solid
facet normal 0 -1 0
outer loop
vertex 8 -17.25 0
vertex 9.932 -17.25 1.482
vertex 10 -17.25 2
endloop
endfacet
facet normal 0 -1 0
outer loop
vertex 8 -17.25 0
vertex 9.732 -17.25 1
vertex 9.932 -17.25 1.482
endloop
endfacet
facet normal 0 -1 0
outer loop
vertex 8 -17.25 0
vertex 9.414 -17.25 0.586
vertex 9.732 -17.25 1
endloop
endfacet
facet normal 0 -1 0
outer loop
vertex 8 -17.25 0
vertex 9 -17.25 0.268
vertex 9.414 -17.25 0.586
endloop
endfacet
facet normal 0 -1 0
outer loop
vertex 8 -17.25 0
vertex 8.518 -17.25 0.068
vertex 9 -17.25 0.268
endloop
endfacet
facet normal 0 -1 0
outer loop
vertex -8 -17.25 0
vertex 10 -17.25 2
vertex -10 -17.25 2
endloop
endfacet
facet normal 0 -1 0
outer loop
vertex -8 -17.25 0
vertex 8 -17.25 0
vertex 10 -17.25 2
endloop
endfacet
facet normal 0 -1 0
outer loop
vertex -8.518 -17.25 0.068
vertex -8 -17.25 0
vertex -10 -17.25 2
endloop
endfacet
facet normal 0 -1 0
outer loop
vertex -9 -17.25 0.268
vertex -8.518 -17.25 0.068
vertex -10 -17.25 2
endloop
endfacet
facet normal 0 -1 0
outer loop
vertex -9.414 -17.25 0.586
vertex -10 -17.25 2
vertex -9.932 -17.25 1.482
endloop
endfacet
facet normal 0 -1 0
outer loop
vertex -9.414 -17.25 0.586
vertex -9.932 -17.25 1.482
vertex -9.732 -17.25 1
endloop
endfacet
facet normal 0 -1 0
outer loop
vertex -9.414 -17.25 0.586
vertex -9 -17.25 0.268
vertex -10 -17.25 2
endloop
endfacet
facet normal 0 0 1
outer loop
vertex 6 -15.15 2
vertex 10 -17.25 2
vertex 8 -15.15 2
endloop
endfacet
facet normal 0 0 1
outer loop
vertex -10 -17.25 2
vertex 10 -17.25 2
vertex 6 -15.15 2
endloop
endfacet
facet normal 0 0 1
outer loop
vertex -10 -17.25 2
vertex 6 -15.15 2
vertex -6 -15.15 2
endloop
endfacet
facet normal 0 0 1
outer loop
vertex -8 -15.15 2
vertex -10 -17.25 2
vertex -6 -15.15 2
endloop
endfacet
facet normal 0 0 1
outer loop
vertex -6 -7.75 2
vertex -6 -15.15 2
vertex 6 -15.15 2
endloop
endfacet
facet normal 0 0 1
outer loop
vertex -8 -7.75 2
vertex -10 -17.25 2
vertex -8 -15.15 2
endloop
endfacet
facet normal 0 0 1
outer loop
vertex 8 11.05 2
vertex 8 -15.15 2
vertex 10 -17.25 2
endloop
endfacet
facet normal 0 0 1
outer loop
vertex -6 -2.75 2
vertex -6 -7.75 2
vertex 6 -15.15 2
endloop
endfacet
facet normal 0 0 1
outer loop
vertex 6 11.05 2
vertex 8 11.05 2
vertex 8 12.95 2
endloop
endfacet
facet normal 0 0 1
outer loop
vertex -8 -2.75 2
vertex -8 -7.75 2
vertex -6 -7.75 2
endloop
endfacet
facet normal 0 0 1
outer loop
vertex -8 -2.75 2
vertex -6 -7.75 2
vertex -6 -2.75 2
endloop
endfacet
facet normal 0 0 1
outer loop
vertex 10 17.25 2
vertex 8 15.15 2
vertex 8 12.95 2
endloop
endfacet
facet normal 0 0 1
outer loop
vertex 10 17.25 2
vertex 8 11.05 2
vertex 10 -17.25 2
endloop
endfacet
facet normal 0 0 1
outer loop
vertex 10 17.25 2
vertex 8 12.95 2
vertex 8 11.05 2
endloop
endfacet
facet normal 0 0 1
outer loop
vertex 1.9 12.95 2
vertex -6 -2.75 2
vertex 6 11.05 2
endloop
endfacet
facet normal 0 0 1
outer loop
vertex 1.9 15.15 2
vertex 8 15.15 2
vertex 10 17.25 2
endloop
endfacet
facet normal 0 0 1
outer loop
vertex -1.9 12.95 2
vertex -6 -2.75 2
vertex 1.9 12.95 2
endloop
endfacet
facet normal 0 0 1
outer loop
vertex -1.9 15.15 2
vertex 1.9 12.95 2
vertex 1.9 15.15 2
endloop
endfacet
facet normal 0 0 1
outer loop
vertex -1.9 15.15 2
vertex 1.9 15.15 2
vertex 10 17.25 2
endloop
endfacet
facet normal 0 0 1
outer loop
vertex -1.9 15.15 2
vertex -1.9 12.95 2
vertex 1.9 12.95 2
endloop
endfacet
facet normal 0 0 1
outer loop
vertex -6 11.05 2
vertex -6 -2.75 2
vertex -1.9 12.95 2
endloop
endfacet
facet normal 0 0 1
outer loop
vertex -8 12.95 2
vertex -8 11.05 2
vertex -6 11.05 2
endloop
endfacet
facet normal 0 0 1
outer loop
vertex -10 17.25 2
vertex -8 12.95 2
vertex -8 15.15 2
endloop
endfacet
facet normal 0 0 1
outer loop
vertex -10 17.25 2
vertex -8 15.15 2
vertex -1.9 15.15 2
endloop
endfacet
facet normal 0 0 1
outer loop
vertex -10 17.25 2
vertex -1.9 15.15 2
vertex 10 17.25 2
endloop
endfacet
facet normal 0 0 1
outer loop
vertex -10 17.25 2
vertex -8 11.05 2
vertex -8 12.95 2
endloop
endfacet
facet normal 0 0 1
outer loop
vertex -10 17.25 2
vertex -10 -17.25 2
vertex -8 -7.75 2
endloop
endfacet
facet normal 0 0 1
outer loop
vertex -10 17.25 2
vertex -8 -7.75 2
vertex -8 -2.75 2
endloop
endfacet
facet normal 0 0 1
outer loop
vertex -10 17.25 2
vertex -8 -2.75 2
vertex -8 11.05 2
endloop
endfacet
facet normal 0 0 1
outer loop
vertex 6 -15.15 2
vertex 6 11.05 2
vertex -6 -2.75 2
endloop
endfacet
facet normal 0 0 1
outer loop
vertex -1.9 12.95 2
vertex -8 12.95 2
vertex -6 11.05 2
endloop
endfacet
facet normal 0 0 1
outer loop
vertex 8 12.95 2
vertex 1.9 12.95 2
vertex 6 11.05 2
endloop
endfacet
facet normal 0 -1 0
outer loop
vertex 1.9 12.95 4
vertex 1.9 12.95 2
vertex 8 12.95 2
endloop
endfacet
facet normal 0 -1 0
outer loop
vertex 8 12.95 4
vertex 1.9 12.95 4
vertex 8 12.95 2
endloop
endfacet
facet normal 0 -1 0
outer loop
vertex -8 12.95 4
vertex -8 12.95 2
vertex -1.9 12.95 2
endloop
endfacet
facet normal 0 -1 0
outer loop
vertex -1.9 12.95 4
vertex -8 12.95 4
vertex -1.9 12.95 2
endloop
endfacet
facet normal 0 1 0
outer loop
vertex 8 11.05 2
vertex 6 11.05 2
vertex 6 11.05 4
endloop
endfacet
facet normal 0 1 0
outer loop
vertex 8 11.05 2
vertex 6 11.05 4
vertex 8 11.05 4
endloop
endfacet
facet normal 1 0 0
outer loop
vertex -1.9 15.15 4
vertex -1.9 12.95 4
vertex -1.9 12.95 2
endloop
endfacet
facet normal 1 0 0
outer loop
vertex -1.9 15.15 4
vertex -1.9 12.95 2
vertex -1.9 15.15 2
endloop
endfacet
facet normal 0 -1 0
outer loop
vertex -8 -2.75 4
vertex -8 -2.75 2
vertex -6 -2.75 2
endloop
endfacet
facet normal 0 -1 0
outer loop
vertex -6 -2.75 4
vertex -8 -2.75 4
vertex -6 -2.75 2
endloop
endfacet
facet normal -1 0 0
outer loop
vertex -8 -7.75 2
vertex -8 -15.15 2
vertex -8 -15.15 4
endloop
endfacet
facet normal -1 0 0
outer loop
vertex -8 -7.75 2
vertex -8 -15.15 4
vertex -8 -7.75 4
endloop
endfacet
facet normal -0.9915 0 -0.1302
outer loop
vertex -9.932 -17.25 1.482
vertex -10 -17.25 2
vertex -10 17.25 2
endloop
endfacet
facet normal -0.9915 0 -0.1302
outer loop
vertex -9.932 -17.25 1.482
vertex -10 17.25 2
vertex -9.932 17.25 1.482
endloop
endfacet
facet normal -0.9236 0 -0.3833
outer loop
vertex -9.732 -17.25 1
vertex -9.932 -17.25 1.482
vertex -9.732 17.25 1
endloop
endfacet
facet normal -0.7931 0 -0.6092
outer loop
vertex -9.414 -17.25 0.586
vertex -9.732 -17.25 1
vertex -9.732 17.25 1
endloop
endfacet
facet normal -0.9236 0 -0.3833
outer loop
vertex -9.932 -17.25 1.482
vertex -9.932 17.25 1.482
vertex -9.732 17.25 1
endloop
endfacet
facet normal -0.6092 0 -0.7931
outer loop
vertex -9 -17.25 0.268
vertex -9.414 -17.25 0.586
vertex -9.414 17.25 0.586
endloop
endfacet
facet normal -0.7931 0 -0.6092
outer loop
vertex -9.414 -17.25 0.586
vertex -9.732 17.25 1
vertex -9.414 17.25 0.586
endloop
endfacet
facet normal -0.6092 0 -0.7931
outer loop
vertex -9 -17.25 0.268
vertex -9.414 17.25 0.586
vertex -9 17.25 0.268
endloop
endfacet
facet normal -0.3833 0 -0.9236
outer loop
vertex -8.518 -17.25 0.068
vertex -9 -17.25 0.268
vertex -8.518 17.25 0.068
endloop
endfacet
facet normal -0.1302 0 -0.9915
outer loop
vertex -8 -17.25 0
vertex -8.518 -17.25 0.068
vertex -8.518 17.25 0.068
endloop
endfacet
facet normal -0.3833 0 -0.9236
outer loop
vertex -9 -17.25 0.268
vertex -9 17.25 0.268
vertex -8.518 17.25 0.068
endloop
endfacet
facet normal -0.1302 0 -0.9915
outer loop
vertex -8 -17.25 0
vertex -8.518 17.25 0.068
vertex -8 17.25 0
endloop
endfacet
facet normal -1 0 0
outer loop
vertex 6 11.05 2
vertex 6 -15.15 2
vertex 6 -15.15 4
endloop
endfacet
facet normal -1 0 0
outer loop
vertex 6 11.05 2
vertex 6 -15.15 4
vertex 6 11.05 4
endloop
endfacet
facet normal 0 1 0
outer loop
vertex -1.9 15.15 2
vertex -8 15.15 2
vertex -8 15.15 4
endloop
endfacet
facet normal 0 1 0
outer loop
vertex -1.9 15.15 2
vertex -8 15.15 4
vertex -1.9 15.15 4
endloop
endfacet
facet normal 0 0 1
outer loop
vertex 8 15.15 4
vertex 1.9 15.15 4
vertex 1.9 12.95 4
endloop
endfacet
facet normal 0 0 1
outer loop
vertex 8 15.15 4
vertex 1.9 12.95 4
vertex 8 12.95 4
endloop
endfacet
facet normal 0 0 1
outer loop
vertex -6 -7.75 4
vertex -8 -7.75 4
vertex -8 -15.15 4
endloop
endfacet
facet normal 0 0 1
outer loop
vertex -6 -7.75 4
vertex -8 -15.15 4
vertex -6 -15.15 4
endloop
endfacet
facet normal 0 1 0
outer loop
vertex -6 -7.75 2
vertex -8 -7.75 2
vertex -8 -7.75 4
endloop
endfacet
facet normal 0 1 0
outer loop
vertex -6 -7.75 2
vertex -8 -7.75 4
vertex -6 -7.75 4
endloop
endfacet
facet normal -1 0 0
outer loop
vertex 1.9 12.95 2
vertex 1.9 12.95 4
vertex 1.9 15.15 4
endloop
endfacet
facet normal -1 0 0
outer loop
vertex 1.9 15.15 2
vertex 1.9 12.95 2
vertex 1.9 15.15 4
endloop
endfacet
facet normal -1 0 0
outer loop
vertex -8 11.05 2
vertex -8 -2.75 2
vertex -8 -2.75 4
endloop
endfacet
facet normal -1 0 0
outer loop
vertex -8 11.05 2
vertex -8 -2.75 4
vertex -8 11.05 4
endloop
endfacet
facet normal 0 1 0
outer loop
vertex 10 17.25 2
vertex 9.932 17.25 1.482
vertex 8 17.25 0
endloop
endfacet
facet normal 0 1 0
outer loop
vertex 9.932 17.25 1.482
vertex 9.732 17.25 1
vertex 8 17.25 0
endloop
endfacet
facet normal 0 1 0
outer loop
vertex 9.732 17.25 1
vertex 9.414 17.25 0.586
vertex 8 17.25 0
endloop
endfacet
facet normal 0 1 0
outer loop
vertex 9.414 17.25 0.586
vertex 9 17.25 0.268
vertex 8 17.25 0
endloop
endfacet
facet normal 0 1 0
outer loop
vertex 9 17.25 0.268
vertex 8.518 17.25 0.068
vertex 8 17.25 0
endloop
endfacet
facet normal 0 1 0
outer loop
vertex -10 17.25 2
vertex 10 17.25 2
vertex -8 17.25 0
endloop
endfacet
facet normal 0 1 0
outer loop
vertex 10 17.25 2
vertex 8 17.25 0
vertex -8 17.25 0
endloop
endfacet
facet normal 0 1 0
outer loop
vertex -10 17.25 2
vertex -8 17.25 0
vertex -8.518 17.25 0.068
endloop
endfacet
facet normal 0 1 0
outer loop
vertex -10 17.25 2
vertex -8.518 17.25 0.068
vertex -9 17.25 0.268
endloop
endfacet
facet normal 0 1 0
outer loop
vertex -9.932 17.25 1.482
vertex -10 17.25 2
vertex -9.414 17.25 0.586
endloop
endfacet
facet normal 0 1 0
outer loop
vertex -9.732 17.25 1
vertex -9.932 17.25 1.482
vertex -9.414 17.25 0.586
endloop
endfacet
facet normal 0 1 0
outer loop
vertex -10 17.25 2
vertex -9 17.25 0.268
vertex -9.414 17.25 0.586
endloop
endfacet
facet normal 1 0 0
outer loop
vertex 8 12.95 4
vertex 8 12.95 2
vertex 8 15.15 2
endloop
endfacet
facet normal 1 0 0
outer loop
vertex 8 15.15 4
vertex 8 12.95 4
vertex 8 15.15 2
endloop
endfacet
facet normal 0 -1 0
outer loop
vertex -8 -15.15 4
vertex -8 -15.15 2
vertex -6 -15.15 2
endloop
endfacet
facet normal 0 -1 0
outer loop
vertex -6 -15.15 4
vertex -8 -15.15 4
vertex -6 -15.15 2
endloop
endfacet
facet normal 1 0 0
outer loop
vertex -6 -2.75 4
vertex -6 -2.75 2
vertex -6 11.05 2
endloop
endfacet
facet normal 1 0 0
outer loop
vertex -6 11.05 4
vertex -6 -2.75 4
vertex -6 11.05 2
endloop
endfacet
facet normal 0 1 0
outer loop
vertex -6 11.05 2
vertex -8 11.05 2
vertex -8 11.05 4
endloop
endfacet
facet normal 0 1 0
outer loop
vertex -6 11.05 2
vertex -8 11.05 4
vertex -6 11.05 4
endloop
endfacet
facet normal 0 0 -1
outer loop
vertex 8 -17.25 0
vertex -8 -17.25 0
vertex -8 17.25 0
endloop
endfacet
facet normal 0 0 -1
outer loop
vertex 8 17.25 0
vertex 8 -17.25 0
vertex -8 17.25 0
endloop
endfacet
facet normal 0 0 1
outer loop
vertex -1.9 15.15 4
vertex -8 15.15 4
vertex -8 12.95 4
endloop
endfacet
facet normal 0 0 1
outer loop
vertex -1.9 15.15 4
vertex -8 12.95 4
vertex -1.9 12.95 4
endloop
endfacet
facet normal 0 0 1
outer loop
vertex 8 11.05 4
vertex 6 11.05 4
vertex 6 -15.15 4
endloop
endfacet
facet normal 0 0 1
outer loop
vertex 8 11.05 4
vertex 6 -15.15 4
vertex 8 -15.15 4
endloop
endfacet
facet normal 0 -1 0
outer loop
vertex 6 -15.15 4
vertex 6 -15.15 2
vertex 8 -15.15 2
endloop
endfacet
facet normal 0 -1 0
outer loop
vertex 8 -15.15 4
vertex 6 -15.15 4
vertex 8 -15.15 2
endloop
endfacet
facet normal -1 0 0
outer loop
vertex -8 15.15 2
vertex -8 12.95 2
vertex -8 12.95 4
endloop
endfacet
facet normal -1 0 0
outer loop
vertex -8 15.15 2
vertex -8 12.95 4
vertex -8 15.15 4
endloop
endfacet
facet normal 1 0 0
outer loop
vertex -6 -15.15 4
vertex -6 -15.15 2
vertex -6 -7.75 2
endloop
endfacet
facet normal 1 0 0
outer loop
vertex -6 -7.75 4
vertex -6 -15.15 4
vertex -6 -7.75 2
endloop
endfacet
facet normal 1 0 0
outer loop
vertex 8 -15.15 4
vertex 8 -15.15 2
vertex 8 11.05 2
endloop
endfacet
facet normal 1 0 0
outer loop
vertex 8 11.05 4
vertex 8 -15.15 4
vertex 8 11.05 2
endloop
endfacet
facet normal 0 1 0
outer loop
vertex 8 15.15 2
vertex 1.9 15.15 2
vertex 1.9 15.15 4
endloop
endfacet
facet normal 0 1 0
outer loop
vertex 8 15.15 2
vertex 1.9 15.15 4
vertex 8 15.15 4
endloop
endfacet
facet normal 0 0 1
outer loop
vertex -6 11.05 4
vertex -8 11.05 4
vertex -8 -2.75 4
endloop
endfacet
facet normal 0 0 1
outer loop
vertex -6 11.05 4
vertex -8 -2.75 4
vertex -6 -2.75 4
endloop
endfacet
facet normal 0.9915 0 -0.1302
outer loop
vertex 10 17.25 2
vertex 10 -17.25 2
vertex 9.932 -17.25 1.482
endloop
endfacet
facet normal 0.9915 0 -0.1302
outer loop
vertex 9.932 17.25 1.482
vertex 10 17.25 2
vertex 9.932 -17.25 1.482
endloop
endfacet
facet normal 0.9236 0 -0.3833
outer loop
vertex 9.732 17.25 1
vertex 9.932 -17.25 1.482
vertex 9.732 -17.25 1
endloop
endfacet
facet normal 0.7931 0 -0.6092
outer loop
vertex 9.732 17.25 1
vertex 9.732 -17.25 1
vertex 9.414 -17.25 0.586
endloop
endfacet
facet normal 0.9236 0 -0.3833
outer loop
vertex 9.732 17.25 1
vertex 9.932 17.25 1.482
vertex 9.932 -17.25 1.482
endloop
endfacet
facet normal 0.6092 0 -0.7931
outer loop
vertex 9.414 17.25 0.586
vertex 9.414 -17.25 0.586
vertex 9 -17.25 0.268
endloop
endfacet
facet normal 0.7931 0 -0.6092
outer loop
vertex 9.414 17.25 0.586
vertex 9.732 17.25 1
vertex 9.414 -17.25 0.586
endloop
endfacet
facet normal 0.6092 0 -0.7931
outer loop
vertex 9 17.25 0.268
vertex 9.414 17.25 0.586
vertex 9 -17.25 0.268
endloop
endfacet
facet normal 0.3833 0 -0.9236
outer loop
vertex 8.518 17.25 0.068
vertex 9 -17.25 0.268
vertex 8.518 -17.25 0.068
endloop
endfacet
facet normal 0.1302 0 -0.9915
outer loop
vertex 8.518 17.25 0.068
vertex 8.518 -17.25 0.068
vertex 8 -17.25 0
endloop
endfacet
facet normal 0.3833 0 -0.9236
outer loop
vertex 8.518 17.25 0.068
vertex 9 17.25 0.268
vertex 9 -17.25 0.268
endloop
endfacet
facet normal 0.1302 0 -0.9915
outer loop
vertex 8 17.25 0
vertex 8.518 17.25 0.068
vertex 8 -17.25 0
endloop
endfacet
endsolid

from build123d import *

# Parameters (mm, degrees)
SKETCH1_W               = 34.5
SKETCH1_H               = 20
BOSS_EXTRUDE1_DEPTH     = 2
FILLET1_R               = 2
SKETCH2_W               = 16
SKETCH2_H               = 2.2
SKETCH2_W_2             = 2
SKETCH2_H_2             = 7.4
SKETCH2_H_3             = 26.2
SKETCH2_H_4             = 13.8
BOSS_EXTRUDE2_DEPTH     = 2
CUT_EXTRUDE1_DEPTH      = 1.9
CUT_EXTRUDE1_DEPTH_BACK = 1.9
SKETCH3_W               = 2.2
SKETCH3_H               = 2


with BuildPart() as part:
    # Sketch1 → Boss-Extrude1 (new body)
    with BuildSketch(Plane(origin=(0, 0, 0), x_dir=(0, 1, 0), z_dir=(0, 0, 1))):
        Rectangle(SKETCH1_W, SKETCH1_H)
    extrude(amount=BOSS_EXTRUDE1_DEPTH)

    # Fillet1
    fillet1_edges = [part.edges().sort_by_distance(p)[0] for p in [
        (-10, 0, 0),
        (10, 0, 0),
    ]]
    fillet(fillet1_edges, radius=FILLET1_R - 0.0001)  # a hair under: the kernel refuses the full size

    # Sketch2 → Boss-Extrude2 (add)
    with BuildSketch(Plane.XY.offset(2)):
        with Locations((0, 14.05)):
            Rectangle(SKETCH2_W, SKETCH2_H)
        with Locations((-7, -11.45)):
            Rectangle(SKETCH2_W_2, SKETCH2_H_2)
        with Locations((7, -2.05)):
            Rectangle(SKETCH2_W_2, SKETCH2_H_3)
        with Locations((-7, 4.15)):
            Rectangle(SKETCH2_W_2, SKETCH2_H_4)
    extrude(amount=BOSS_EXTRUDE2_DEPTH)

    # Sketch3 → Cut-Extrude1 (cut, two sides: drawn at the far end of the back side and taken through both)
    with BuildSketch(Plane.YZ.offset(-CUT_EXTRUDE1_DEPTH_BACK)):
        with Locations((14.05, 3)):
            Rectangle(SKETCH3_W, SKETCH3_H)
    extrude(amount=CUT_EXTRUDE1_DEPTH + CUT_EXTRUDE1_DEPTH_BACK, mode=Mode.SUBTRACT)


solid = part.part
